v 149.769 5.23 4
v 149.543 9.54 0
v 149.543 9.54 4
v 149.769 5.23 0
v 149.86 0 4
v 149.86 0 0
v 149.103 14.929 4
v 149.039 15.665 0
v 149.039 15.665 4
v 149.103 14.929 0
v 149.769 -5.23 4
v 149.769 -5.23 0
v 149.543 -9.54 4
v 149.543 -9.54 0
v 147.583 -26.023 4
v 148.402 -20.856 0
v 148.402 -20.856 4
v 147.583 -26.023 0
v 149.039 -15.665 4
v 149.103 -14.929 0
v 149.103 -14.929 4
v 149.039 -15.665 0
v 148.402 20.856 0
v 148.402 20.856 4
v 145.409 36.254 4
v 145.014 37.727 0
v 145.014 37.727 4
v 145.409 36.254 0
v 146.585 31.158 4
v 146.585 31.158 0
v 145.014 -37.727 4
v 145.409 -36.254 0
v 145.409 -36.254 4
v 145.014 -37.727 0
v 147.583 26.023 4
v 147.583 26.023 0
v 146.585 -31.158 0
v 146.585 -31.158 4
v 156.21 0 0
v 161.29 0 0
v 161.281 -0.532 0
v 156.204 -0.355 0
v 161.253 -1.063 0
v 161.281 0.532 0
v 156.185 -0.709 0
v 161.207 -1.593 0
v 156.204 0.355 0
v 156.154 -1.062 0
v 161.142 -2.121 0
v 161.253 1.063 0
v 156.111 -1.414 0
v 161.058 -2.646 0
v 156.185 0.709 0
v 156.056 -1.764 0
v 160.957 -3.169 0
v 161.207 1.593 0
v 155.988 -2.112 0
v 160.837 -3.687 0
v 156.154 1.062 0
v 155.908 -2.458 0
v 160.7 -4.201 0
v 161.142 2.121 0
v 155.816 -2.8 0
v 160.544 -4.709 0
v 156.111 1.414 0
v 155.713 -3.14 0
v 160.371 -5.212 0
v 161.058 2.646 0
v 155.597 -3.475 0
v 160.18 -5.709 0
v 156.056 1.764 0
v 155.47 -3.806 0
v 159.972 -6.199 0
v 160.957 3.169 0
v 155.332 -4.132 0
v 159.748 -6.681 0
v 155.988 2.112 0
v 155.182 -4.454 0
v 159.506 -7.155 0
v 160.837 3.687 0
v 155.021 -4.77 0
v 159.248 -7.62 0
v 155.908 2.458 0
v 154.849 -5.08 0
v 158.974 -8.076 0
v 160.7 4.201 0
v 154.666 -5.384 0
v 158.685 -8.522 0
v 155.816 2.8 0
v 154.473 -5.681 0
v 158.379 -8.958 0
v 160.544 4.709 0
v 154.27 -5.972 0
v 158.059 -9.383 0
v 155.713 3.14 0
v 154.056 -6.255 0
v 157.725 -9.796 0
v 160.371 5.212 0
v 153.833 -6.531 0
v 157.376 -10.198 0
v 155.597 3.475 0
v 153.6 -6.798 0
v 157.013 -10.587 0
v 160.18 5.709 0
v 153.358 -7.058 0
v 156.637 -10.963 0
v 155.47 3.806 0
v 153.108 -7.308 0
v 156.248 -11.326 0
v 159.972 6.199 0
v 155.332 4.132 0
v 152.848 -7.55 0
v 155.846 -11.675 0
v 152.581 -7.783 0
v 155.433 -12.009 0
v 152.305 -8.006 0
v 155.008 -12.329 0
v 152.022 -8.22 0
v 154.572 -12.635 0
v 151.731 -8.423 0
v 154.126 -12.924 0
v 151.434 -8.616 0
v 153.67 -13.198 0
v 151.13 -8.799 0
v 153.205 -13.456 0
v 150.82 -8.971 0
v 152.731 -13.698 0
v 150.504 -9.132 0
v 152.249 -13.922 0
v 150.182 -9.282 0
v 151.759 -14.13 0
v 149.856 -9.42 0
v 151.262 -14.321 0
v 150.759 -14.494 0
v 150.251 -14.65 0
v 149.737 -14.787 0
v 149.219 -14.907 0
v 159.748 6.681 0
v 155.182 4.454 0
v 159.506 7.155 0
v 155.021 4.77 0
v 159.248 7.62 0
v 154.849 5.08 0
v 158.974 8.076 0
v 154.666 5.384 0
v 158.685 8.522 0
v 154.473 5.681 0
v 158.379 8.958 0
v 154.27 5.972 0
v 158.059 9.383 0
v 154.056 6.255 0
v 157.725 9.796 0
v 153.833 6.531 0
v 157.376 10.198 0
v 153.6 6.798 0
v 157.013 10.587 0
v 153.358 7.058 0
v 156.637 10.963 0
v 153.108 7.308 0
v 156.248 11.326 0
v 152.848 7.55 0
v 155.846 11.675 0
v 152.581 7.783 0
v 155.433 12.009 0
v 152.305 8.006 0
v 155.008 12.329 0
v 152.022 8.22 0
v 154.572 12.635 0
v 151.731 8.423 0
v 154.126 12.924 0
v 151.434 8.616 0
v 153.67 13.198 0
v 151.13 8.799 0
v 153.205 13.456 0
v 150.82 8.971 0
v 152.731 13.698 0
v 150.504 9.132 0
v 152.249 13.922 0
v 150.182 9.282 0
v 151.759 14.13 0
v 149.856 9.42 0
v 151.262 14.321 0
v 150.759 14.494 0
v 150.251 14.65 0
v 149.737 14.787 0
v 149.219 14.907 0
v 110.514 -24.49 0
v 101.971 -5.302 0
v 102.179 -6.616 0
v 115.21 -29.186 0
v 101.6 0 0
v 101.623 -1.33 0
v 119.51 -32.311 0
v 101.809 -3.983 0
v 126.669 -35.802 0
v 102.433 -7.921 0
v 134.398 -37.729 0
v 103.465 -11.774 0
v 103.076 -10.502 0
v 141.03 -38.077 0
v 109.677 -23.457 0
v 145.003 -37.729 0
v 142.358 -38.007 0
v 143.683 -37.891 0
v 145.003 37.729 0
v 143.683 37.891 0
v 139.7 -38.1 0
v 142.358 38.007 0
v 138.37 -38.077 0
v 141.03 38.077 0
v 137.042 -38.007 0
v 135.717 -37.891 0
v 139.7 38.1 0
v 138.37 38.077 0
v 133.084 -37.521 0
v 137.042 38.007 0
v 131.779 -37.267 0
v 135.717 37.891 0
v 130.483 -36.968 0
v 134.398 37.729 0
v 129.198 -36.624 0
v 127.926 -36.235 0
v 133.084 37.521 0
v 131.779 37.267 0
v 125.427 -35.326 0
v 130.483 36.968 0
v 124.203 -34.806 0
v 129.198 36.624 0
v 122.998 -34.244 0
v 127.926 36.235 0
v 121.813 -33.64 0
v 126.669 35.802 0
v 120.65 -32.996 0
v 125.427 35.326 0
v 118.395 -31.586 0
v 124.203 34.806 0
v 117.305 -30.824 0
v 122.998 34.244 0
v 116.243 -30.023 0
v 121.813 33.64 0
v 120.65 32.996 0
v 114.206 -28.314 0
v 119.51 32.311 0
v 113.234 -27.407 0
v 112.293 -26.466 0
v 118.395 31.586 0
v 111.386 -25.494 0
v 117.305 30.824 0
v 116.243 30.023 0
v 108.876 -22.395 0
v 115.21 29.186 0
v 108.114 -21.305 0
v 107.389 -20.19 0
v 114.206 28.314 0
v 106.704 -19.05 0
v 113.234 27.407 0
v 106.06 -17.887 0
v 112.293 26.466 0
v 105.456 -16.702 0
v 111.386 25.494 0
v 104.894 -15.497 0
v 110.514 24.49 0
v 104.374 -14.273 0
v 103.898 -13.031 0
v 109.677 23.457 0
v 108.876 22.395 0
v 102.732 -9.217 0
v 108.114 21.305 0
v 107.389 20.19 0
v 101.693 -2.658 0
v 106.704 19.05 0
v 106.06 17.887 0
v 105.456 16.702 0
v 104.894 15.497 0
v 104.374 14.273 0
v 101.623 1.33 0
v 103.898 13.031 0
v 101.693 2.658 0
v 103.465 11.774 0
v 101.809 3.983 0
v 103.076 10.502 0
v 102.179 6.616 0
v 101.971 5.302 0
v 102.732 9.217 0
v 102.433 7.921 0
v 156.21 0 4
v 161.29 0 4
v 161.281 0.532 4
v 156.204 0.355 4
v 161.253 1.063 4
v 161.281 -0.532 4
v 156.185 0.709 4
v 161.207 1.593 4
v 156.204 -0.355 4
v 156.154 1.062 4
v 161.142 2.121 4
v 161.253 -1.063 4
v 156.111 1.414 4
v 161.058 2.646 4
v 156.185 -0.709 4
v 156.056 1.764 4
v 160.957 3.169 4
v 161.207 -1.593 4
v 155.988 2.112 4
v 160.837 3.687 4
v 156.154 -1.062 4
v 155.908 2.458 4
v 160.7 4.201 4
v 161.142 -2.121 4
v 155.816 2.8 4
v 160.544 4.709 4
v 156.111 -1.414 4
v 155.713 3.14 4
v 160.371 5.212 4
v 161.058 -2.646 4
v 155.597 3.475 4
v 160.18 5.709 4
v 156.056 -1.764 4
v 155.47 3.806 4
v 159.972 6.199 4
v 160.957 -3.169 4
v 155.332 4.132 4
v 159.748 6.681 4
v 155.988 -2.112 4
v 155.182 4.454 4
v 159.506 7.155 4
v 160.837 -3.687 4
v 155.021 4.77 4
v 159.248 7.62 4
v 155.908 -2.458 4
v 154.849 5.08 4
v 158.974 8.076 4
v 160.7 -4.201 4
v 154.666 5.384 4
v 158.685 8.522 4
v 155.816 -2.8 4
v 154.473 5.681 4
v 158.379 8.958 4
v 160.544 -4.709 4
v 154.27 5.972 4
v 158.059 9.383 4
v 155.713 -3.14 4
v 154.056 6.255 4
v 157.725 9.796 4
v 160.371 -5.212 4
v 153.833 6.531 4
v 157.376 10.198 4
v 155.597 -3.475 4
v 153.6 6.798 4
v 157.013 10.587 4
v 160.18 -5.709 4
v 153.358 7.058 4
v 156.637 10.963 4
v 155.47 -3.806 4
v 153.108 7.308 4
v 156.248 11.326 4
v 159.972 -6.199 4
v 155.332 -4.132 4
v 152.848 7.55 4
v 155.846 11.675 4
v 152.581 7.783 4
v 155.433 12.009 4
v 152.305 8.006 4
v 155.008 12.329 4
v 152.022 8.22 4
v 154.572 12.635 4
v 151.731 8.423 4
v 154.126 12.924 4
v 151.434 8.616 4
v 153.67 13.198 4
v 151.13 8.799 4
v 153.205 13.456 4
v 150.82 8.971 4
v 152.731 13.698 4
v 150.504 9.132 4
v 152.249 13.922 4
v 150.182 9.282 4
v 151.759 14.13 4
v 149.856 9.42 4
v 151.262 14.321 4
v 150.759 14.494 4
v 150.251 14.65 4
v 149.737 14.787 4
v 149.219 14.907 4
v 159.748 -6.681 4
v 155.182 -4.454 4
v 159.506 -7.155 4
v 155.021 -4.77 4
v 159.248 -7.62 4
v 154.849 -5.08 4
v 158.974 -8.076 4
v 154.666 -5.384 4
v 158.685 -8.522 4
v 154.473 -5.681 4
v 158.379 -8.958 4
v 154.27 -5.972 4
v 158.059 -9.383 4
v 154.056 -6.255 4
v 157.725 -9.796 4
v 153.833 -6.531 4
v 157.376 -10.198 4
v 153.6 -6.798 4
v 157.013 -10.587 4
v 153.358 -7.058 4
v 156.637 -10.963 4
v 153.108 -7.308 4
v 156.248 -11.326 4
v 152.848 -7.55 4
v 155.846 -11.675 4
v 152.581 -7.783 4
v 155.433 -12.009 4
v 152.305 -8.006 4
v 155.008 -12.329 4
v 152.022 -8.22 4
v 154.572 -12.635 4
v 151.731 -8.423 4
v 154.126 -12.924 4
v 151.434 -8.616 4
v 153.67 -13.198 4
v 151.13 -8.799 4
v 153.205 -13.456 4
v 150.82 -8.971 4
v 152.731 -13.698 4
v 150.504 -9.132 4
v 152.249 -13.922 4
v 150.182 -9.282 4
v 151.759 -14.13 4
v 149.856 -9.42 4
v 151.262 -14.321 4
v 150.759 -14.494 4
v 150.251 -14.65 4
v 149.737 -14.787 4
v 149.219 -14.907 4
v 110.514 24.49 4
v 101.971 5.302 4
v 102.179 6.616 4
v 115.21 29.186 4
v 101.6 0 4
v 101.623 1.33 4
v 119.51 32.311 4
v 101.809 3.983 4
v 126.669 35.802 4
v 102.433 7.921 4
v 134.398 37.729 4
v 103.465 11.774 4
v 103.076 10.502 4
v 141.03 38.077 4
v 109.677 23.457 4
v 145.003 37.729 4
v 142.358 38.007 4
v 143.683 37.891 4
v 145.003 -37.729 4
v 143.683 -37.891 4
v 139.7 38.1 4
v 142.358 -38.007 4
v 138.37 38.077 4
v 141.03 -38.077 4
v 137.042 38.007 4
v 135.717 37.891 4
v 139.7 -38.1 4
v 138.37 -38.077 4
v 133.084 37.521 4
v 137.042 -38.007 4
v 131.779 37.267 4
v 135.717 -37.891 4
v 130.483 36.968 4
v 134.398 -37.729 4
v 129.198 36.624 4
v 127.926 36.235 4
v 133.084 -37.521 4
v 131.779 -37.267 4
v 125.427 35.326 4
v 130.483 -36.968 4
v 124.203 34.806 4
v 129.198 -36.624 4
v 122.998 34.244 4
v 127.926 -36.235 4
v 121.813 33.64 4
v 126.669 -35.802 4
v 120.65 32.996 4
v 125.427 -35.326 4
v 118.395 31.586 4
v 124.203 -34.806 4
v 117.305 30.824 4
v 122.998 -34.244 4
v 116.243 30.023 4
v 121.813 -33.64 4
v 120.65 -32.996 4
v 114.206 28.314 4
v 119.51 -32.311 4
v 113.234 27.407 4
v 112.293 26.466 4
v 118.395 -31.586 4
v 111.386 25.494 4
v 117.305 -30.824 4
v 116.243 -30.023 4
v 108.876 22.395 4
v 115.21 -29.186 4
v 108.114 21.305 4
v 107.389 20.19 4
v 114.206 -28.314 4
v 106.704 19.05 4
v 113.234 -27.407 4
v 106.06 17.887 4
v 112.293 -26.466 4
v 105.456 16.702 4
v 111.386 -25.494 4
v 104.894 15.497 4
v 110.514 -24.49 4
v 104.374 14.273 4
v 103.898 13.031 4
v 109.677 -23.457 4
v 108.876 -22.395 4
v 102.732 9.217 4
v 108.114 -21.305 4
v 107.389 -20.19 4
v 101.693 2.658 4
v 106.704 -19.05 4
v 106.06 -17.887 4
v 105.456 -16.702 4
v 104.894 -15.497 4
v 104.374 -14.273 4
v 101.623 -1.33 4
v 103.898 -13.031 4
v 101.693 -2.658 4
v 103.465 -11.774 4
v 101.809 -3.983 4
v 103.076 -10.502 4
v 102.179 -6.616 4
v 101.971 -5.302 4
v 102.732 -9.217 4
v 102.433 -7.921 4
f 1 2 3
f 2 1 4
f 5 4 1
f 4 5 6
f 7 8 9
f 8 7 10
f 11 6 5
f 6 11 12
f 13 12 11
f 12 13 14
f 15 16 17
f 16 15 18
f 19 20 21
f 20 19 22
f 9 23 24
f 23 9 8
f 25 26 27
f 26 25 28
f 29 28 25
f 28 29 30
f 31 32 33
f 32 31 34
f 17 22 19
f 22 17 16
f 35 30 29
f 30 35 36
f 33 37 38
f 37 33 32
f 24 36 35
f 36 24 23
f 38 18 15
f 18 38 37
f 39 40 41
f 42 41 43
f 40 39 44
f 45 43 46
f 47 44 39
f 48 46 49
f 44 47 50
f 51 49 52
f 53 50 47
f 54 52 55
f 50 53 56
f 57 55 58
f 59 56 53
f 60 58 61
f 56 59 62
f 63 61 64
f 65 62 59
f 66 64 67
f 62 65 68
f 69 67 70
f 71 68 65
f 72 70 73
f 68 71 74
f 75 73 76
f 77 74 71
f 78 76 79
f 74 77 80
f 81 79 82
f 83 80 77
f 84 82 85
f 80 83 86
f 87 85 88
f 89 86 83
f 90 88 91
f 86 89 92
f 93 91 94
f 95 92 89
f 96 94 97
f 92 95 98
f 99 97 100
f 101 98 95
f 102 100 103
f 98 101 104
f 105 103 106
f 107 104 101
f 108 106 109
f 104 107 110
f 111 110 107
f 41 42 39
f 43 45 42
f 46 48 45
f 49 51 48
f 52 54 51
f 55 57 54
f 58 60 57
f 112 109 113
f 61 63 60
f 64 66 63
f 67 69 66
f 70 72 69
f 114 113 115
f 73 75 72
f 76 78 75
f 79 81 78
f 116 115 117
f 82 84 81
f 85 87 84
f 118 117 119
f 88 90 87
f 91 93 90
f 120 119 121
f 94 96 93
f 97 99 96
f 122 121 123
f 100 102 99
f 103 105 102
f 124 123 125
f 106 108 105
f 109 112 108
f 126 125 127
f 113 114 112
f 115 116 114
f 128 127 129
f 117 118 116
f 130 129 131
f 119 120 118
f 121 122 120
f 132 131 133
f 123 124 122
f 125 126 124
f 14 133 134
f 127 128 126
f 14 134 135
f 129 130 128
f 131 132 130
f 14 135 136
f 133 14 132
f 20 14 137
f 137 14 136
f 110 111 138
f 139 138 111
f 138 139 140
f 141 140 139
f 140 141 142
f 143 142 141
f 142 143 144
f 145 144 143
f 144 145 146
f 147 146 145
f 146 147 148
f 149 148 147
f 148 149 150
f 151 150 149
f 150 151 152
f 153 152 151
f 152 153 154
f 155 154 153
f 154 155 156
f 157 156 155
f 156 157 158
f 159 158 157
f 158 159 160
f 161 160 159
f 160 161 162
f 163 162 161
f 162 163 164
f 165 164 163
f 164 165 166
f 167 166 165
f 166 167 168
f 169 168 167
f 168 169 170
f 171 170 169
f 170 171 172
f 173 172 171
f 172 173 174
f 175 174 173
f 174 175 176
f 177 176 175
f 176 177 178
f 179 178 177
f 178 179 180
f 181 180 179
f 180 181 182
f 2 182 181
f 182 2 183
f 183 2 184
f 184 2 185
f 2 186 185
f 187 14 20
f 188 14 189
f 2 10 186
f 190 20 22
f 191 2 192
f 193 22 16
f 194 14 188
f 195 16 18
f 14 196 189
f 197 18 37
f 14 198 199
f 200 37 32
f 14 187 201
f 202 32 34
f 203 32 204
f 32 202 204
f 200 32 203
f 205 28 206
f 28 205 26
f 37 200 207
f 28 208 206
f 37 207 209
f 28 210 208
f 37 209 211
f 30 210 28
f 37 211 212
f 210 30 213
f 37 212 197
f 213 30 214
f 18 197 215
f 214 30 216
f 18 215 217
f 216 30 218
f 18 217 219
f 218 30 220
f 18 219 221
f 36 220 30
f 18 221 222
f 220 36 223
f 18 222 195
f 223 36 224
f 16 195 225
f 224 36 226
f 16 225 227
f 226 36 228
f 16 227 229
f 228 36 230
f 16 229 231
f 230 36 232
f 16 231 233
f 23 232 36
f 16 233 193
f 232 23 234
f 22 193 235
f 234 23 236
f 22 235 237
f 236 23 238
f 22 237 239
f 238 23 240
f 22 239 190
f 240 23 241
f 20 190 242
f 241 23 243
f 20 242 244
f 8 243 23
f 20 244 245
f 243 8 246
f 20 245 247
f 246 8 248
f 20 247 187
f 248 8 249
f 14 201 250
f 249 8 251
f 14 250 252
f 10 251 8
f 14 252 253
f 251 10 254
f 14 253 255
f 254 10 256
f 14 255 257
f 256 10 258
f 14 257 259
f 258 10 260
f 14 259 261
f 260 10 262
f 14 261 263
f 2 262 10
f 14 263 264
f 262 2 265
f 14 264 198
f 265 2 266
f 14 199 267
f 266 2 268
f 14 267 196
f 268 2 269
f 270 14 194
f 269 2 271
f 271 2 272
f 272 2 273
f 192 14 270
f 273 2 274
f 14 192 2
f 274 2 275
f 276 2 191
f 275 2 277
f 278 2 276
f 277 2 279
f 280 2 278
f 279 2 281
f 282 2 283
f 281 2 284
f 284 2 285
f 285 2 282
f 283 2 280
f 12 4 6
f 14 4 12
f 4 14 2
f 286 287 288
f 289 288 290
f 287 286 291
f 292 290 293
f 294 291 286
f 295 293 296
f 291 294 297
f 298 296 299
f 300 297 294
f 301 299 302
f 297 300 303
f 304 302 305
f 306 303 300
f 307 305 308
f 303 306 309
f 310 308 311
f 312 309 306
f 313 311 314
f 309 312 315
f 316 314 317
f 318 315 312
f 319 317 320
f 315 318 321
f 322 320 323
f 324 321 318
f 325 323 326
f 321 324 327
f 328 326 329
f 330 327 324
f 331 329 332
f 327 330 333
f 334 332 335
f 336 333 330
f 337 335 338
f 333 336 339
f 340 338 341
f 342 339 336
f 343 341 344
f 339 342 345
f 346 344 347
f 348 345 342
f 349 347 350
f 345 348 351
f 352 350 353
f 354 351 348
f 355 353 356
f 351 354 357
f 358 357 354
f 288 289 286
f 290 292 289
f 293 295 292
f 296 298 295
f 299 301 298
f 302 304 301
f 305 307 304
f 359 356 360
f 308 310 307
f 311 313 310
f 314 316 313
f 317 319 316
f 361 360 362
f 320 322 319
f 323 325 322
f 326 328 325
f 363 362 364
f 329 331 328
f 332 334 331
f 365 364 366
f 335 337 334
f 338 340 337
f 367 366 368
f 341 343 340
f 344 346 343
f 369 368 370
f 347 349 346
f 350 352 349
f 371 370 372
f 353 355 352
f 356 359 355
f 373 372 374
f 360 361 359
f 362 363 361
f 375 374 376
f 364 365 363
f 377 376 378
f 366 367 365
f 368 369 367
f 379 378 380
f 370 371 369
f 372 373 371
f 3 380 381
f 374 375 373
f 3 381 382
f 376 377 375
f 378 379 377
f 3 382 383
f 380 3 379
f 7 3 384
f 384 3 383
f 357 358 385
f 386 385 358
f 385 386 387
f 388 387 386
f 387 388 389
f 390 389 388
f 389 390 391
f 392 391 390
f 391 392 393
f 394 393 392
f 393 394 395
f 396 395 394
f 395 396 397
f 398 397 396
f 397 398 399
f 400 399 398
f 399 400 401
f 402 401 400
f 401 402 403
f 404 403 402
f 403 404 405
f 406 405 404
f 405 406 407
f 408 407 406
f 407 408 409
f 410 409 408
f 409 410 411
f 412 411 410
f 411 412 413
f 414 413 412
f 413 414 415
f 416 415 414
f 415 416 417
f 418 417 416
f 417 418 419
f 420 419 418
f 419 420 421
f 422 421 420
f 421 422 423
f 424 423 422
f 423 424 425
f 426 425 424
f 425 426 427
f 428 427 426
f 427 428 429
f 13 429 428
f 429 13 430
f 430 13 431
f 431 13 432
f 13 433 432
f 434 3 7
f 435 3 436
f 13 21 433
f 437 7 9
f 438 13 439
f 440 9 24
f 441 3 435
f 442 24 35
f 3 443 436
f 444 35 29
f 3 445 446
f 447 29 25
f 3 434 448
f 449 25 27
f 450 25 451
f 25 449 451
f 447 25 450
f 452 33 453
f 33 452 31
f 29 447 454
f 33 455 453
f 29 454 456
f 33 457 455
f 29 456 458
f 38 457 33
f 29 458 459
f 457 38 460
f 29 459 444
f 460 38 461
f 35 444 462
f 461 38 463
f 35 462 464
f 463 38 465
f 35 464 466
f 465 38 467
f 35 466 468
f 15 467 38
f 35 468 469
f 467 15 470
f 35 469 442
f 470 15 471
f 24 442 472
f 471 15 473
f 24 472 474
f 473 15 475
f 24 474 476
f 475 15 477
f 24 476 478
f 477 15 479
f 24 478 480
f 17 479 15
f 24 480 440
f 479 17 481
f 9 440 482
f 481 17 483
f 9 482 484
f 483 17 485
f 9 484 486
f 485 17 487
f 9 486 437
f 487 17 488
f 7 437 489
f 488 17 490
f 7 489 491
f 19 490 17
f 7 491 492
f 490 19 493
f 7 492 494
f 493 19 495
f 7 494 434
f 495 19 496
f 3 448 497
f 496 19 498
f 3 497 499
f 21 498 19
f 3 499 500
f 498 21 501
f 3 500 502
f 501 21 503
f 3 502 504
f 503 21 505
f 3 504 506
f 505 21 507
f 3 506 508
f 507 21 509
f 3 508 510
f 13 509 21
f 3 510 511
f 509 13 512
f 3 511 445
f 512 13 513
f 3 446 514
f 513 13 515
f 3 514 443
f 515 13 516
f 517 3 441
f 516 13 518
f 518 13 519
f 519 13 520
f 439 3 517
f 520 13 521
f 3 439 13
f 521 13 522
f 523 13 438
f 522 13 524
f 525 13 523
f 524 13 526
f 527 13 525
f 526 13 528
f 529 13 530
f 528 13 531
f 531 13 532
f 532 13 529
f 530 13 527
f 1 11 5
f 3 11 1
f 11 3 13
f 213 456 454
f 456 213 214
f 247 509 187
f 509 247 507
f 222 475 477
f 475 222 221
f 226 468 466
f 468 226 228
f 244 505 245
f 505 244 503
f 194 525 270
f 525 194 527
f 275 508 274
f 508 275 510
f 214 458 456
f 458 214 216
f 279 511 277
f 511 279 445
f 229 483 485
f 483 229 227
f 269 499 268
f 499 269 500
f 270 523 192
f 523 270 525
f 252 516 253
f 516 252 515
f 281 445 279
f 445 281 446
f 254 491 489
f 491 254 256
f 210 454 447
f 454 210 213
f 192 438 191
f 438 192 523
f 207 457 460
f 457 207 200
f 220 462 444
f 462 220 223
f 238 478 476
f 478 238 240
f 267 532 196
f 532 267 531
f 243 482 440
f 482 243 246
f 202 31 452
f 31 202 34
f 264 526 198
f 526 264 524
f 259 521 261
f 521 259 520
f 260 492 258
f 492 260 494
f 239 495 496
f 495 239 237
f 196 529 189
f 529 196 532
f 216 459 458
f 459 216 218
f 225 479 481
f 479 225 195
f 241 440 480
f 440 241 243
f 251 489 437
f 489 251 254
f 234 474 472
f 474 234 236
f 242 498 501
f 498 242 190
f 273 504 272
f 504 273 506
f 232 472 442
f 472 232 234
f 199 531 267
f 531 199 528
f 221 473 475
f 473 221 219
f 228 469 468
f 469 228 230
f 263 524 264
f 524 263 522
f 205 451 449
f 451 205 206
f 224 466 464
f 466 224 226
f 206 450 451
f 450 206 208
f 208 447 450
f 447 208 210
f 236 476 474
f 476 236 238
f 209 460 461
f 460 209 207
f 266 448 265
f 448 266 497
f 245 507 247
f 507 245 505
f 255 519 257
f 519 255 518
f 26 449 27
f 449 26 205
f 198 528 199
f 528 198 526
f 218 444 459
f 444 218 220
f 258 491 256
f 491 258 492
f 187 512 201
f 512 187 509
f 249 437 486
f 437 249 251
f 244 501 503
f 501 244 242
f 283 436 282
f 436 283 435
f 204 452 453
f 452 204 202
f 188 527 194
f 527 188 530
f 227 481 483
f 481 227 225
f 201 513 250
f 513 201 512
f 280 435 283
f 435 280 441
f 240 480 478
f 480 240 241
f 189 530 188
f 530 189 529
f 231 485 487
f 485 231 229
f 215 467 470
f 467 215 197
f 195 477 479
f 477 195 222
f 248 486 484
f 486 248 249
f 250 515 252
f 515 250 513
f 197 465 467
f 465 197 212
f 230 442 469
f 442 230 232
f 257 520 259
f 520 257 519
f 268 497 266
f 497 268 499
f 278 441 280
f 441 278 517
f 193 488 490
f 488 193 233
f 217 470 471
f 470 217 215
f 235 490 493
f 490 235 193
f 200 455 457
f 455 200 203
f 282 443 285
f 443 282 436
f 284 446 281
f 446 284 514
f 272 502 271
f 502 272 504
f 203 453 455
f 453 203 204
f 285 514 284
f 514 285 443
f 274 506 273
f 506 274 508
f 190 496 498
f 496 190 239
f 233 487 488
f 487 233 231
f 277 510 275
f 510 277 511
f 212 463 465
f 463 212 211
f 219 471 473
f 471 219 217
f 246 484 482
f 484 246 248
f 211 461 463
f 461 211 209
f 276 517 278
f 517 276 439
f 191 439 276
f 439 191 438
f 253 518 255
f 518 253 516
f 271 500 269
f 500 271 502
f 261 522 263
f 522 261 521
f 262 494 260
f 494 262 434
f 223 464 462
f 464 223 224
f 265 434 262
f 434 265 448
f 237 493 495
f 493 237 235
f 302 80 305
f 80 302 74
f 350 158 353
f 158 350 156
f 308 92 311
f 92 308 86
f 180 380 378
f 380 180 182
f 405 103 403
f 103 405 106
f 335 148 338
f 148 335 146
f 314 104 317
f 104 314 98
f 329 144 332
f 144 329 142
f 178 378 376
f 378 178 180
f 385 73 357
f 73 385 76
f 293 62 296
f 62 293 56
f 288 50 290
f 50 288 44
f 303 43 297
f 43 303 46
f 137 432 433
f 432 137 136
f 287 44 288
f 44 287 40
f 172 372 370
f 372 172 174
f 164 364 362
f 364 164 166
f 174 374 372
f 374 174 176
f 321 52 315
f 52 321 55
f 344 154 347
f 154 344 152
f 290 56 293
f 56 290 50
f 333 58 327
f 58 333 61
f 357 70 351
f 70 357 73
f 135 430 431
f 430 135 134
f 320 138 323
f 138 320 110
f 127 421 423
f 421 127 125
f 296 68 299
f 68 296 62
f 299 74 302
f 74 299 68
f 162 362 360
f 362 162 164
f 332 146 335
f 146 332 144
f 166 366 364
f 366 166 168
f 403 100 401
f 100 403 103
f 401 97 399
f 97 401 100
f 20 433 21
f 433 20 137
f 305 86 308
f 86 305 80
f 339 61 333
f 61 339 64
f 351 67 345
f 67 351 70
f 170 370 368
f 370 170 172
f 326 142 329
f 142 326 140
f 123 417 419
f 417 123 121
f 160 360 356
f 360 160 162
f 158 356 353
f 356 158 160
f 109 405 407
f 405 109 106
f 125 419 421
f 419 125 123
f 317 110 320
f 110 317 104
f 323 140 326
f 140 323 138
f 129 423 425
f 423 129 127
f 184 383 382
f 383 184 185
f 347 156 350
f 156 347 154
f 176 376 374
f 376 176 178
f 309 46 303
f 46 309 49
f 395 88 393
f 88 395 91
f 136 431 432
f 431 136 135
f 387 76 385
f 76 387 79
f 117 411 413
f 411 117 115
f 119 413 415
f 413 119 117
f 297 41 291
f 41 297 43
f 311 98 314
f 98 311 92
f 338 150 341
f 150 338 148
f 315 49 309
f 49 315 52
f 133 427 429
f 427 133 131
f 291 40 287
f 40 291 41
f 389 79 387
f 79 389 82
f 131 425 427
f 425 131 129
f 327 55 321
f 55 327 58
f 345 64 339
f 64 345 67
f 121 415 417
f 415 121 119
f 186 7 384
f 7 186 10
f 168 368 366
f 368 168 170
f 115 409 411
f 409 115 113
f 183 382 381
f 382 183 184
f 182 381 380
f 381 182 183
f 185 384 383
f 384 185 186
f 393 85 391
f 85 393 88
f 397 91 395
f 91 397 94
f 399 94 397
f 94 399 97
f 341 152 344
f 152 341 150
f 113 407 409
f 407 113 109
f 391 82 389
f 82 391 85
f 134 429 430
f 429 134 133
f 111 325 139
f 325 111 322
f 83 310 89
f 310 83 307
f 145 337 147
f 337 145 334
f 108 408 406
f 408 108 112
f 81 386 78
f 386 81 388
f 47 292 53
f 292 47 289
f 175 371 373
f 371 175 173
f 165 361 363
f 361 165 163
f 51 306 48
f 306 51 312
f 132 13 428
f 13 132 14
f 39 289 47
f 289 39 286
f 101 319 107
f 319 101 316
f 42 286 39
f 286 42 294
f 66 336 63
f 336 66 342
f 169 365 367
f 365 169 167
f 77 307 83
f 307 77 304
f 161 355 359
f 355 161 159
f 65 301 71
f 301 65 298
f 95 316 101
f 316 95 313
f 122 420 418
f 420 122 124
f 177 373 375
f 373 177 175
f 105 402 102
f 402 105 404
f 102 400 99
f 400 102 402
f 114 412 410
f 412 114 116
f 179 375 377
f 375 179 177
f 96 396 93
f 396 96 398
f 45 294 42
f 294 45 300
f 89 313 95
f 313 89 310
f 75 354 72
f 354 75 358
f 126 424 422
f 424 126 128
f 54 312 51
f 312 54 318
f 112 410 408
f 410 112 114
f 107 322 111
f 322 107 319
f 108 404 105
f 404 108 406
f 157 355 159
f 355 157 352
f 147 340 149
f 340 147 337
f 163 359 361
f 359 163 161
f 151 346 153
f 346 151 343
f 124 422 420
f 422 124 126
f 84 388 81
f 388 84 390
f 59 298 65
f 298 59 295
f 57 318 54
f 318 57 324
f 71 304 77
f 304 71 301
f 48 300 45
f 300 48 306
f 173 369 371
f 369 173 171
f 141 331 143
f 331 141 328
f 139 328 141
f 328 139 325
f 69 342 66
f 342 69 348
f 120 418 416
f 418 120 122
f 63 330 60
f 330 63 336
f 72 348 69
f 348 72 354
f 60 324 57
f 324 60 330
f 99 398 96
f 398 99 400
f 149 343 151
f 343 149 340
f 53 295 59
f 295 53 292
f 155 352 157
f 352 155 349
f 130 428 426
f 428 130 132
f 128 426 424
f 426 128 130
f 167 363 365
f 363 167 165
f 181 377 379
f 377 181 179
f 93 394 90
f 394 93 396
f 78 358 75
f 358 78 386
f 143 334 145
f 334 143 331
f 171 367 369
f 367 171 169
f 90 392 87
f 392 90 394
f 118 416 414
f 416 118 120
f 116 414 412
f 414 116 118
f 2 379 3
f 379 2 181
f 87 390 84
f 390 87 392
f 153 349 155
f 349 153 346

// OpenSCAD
$fn=180;
intersection(){
cylinder(r=5.9*25.4, h=4);

translate([5.5*25.4,0,0])
cylinder(r=1.5*25.4, h=4.2);

}
difference(){
translate([5.75*25.4,0,0])
cylinder(r=.6*25.4, h=4);

translate([5.75*25.4,0,-.1])
cylinder(r=.4*25.4, h=4.2);

}
